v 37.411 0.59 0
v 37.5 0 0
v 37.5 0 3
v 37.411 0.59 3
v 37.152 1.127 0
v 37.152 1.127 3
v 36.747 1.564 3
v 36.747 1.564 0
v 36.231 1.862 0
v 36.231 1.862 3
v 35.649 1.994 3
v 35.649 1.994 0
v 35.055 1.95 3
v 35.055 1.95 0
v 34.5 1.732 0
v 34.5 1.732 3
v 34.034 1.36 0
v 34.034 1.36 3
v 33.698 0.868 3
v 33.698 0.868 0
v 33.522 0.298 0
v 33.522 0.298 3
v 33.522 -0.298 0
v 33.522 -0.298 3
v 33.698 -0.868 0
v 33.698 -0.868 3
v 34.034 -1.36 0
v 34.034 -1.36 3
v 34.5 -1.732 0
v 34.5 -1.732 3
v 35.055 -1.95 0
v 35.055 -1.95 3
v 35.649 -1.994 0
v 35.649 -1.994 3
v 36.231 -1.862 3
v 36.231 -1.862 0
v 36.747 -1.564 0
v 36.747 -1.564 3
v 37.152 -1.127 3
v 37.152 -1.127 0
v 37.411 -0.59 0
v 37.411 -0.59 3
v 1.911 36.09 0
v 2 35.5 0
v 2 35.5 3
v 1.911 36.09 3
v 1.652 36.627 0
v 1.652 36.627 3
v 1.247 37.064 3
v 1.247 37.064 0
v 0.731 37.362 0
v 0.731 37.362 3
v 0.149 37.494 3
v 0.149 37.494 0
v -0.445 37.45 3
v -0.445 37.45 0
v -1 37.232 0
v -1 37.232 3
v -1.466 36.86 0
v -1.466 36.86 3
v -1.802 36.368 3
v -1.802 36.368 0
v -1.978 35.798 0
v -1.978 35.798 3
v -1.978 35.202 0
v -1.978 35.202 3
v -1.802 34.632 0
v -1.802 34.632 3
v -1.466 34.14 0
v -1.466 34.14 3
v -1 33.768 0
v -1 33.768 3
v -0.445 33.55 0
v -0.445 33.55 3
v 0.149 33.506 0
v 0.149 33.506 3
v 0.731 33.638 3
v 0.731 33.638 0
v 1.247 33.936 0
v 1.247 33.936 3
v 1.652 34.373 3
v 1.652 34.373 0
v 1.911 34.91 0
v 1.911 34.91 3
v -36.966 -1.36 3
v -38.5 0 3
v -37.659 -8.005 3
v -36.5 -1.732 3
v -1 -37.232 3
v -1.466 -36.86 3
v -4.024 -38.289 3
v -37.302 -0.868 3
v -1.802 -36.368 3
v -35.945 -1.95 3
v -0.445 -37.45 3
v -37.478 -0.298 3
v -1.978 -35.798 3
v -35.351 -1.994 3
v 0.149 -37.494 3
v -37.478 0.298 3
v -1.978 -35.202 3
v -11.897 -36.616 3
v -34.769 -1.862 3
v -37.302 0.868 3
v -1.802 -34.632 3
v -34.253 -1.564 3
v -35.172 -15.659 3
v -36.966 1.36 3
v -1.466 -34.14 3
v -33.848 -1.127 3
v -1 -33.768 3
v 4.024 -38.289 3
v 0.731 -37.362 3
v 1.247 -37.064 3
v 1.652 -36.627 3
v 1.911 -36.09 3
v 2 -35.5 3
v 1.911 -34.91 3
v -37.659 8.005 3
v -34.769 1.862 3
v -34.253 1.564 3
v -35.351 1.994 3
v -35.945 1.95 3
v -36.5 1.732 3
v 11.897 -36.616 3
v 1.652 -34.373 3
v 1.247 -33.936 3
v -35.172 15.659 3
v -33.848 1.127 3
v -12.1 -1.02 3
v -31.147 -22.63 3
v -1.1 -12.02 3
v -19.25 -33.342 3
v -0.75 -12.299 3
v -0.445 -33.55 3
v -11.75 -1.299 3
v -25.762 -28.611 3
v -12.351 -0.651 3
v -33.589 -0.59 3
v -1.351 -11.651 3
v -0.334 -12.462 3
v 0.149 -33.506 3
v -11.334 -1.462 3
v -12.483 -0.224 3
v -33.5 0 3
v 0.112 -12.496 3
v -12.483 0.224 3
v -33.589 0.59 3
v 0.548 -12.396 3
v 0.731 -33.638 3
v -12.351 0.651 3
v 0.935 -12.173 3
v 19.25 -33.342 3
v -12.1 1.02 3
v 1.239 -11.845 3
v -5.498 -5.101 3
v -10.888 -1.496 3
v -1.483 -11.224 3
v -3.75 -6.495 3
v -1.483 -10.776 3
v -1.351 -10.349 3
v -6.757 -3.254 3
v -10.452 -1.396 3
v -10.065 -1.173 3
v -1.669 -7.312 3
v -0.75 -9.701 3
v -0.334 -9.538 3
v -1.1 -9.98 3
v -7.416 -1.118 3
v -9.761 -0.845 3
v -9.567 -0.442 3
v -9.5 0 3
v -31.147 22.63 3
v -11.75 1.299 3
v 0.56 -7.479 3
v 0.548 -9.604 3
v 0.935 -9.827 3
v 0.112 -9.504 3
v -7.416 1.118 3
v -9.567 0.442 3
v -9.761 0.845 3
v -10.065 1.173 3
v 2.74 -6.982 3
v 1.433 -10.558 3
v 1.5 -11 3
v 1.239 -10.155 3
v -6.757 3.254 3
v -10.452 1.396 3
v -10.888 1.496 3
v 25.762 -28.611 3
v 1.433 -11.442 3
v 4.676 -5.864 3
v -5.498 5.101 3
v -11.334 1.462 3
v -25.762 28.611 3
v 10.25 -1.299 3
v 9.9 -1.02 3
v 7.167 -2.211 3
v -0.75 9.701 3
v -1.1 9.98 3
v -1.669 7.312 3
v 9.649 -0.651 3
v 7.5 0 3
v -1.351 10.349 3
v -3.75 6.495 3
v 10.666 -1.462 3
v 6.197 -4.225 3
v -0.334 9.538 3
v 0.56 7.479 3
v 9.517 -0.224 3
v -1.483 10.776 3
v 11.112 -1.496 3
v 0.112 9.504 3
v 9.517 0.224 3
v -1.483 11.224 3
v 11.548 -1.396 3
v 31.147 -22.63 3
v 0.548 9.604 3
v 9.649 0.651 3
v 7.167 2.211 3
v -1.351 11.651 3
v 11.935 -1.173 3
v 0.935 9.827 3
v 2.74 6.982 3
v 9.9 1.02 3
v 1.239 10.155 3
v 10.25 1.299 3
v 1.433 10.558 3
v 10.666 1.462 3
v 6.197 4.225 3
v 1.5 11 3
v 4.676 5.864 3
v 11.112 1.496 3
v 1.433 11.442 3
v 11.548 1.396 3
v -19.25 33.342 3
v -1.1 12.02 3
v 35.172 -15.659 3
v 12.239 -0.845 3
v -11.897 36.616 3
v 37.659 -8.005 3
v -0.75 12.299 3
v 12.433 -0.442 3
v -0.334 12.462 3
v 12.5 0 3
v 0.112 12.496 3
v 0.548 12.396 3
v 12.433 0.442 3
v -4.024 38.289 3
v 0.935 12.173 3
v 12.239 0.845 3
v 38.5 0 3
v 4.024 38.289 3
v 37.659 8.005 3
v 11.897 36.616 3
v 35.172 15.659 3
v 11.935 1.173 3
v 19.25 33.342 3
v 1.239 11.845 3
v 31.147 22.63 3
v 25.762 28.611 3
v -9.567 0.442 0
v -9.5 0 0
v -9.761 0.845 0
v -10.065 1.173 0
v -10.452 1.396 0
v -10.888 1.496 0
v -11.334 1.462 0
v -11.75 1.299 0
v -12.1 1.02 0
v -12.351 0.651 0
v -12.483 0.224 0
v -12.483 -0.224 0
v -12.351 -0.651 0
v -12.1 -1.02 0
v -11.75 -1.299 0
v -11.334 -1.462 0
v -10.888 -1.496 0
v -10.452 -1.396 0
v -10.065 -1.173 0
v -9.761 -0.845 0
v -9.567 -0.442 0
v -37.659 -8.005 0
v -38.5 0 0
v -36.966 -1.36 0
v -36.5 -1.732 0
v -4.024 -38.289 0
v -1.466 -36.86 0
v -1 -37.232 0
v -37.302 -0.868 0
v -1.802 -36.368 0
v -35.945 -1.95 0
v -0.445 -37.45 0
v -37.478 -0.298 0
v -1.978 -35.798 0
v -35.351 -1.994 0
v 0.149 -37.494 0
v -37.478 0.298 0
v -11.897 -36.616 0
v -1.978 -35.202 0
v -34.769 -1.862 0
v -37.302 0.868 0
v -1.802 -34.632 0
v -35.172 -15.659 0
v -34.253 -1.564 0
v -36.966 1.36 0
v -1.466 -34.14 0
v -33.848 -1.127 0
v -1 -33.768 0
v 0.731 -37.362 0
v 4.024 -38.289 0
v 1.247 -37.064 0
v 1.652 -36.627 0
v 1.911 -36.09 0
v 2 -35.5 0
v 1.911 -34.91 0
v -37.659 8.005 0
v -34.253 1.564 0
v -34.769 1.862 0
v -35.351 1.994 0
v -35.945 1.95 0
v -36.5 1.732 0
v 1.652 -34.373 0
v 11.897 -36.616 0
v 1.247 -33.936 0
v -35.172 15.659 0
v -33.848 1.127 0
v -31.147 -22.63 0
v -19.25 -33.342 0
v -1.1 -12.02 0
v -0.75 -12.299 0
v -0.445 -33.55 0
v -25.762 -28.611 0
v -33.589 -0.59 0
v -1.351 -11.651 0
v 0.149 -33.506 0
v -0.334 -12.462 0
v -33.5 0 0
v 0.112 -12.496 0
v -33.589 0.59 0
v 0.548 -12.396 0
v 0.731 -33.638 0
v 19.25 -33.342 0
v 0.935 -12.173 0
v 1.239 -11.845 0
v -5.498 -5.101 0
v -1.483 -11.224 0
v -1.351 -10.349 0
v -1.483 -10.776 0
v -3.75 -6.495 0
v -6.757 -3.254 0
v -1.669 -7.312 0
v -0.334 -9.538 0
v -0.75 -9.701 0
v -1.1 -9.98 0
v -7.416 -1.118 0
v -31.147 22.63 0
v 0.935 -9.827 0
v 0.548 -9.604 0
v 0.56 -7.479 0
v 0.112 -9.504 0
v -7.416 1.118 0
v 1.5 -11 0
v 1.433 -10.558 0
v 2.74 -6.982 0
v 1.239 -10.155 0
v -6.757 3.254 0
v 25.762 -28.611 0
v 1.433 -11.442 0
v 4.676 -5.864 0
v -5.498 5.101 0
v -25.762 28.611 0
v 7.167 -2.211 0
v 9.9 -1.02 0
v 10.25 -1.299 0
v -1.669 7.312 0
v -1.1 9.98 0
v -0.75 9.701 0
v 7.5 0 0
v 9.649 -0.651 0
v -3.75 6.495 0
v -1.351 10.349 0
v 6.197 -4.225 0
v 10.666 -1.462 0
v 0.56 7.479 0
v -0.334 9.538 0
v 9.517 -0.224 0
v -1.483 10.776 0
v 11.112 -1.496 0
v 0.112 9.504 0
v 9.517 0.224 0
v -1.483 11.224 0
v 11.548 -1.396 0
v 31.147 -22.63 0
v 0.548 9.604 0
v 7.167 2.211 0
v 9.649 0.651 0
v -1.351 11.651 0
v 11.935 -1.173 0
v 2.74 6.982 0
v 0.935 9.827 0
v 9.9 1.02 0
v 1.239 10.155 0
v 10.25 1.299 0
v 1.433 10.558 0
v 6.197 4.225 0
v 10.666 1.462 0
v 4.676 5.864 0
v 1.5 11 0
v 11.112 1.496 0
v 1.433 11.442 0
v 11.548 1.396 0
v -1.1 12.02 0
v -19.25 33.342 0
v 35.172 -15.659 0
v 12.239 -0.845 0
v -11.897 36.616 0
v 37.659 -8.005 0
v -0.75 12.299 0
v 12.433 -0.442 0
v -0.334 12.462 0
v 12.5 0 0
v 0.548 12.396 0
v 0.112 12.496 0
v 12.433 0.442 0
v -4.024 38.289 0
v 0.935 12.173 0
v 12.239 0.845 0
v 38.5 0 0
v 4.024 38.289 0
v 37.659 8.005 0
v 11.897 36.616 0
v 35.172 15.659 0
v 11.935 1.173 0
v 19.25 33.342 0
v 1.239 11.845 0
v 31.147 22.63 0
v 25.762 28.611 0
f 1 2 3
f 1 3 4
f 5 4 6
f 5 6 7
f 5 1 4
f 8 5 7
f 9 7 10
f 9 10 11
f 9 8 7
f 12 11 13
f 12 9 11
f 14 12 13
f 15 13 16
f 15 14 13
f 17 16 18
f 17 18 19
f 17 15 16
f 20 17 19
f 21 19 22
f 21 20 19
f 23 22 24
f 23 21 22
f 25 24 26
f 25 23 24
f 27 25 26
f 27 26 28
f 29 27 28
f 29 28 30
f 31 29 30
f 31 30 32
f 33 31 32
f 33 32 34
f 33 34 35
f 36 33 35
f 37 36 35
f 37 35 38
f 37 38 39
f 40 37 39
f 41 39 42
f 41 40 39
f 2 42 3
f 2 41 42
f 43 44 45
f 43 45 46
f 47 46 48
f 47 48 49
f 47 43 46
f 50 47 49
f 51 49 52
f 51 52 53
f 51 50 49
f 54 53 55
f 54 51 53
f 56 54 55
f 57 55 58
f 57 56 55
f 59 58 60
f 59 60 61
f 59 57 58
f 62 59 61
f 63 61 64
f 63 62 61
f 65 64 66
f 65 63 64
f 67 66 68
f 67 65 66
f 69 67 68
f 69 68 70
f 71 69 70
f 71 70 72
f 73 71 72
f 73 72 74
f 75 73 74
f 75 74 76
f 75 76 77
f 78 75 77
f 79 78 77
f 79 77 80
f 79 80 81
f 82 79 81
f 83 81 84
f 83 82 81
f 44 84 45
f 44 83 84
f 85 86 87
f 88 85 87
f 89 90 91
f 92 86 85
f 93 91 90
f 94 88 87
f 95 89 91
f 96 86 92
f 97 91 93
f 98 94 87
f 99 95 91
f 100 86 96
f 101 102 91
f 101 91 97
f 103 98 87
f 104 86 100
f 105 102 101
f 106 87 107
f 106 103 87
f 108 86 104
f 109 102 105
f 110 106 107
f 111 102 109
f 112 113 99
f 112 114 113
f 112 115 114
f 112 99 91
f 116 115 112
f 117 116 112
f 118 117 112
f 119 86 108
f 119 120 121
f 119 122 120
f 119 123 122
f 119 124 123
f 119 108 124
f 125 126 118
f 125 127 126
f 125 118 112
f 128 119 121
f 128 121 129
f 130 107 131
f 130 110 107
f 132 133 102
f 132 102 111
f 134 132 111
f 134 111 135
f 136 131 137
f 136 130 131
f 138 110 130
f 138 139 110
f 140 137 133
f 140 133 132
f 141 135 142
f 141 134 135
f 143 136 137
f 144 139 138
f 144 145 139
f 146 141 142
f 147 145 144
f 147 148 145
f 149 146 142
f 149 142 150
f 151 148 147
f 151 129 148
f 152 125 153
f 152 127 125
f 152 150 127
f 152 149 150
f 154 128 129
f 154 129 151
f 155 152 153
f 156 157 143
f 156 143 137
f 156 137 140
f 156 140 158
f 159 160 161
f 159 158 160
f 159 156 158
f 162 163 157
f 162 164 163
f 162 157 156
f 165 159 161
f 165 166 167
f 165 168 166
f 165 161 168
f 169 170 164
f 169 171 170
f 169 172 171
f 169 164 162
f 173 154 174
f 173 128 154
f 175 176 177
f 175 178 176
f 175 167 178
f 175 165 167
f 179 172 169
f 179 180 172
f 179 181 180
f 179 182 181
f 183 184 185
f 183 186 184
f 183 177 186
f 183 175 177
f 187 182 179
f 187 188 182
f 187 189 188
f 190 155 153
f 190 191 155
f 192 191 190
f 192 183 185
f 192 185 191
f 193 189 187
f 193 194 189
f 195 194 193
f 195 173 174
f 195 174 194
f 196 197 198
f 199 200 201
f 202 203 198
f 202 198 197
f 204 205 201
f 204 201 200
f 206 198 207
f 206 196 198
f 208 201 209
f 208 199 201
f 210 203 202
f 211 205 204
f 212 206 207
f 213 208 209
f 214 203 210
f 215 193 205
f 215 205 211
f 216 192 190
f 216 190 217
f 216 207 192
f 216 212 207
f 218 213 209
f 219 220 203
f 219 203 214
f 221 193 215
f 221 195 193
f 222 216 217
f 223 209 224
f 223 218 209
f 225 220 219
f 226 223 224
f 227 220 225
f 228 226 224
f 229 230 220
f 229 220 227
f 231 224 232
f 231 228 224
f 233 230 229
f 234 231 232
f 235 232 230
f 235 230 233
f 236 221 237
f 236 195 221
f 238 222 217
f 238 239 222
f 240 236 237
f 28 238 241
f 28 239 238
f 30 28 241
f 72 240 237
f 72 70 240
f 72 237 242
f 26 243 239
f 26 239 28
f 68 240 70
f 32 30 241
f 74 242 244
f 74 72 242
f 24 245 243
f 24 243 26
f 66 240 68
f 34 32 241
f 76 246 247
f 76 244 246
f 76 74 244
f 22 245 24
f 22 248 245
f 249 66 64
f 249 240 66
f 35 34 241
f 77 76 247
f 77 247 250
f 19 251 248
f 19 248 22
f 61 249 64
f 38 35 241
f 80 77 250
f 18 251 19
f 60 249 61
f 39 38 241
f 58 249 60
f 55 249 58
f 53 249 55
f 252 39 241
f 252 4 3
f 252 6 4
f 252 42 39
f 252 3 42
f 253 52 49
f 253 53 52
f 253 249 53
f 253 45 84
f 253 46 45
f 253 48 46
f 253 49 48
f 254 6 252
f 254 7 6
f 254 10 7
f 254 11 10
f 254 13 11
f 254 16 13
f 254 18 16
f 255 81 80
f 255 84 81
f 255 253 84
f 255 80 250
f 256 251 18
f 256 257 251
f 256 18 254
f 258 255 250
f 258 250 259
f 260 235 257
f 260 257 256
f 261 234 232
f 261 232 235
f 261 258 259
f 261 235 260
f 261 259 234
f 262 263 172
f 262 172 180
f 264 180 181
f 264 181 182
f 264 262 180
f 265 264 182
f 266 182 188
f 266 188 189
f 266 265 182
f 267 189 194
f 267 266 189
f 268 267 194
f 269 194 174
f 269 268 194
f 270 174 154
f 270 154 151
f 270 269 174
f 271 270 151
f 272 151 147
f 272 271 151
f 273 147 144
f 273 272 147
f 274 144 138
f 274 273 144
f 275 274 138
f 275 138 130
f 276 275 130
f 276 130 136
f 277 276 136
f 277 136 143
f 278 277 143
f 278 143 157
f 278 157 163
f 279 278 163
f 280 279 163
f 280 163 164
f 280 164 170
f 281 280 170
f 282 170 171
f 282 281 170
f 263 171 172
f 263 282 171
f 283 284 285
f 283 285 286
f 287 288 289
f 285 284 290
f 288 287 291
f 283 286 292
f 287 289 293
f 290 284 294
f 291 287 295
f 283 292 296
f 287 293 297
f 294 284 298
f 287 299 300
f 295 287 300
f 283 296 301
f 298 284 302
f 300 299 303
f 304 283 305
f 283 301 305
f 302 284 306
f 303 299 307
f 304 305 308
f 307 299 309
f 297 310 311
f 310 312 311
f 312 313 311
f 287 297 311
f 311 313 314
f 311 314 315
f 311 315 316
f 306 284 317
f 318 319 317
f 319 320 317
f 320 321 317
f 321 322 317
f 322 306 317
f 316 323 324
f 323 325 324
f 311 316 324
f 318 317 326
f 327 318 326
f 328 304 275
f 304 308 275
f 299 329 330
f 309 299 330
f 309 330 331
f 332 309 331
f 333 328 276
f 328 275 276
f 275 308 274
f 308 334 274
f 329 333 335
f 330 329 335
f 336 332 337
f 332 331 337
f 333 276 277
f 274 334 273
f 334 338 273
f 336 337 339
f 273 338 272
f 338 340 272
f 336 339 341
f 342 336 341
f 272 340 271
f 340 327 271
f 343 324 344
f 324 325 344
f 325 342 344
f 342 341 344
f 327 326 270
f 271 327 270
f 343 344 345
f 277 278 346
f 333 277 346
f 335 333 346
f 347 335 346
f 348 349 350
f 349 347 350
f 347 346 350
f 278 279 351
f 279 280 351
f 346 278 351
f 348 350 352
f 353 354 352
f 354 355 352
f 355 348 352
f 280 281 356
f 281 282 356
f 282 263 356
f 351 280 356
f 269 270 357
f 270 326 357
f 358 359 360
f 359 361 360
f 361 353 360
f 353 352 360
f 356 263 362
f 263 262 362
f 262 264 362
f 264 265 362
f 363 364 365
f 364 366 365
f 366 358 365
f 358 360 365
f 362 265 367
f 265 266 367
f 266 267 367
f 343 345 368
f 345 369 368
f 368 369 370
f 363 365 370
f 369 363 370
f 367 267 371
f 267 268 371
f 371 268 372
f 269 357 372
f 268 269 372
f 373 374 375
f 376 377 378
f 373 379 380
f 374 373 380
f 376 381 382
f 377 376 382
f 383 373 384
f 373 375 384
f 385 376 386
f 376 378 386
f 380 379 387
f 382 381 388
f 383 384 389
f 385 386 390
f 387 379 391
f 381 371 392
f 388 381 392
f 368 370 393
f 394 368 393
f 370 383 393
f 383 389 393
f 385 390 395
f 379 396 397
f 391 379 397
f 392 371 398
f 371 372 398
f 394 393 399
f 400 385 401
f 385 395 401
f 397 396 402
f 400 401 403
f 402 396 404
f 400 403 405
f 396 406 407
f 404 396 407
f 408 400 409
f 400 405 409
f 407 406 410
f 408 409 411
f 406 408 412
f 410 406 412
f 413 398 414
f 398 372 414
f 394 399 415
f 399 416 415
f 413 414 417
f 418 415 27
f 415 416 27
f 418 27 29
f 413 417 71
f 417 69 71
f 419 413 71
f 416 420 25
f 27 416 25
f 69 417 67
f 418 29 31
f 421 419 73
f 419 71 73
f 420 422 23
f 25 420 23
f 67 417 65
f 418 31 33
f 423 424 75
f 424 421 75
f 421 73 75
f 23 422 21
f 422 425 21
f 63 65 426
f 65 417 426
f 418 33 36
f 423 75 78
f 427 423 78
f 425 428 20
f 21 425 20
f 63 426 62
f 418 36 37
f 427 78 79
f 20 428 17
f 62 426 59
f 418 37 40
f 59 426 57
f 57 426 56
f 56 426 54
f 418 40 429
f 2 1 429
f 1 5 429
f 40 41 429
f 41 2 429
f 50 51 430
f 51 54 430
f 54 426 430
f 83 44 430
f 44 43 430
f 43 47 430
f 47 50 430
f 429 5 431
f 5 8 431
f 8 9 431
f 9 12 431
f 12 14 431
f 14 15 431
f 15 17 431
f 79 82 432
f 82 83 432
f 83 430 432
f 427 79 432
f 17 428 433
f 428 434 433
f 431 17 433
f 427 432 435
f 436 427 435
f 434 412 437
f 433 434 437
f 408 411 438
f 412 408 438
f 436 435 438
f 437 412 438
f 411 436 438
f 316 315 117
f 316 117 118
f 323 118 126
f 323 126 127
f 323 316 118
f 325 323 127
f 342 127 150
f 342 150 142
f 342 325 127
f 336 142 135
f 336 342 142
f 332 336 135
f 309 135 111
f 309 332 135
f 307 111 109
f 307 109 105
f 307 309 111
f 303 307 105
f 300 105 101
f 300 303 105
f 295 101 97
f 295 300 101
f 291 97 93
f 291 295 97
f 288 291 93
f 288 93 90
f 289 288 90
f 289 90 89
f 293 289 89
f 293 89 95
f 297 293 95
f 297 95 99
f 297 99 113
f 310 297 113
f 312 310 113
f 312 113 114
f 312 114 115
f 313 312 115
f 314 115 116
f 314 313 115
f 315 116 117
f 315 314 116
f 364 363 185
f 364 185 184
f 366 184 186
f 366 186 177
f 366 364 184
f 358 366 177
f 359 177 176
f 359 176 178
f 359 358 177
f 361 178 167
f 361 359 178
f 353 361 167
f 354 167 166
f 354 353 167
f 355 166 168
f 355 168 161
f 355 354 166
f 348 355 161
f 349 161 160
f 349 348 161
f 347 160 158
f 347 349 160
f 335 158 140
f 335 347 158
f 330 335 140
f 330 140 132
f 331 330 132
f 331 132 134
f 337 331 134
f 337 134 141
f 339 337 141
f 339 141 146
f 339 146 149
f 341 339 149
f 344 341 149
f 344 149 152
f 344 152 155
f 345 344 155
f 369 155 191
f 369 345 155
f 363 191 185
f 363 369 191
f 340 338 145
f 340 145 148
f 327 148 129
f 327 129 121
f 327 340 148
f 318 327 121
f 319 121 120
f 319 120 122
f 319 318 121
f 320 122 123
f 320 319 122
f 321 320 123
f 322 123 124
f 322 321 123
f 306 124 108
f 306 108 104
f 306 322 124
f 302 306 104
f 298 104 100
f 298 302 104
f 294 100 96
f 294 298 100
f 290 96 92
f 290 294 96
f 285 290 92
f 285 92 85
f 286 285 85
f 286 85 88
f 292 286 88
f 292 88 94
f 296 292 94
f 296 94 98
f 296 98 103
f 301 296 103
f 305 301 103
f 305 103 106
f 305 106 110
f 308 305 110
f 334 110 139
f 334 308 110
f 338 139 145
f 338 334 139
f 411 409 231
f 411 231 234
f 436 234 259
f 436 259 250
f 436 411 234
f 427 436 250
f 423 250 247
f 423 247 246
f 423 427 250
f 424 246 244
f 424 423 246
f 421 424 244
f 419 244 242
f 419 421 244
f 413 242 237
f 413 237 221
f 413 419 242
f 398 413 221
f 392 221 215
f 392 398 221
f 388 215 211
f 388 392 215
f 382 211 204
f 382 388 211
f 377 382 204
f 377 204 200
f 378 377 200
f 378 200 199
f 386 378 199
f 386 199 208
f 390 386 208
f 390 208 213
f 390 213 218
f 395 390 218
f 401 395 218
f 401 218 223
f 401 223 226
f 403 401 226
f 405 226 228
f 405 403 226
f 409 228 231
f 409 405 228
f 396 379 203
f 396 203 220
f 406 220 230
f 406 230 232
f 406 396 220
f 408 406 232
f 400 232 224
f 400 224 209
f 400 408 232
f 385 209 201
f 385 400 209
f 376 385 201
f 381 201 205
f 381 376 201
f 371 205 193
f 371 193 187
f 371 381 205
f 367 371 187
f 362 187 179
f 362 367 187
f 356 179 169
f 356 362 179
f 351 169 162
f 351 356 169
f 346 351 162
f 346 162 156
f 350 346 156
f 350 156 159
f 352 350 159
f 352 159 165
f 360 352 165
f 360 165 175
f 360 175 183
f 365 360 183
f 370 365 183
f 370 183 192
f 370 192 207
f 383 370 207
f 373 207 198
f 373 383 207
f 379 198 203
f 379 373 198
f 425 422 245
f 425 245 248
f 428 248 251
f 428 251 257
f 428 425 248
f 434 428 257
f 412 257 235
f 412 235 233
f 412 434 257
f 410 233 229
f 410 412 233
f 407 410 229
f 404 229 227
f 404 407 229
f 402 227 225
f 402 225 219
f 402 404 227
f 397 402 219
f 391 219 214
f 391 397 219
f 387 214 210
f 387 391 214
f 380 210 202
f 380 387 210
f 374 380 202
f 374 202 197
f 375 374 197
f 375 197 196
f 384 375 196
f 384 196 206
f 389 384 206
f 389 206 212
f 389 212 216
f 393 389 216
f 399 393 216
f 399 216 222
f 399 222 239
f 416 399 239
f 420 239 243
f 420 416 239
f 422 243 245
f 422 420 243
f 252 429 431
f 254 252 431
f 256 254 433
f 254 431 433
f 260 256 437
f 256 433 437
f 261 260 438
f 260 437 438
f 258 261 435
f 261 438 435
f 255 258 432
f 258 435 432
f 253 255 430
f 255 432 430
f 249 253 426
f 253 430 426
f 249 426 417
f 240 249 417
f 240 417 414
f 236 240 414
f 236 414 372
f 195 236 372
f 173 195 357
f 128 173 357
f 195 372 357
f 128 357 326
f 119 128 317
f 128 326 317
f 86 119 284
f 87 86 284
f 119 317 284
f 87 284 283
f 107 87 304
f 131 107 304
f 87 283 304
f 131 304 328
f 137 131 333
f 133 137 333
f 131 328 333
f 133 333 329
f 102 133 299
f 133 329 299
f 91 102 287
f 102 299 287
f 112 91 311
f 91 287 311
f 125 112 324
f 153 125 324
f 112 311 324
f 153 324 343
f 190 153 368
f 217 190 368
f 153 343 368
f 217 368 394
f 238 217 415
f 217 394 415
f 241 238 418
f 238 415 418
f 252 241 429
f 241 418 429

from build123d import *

# Parameters (mm, degrees)
SKETCH1_R           = 38.5
SKETCH1_R_2         = 1.5
SKETCH1_R_3         = 2
SKETCH1_R_4         = 7.5
BOSS_EXTRUDE1_DEPTH = 3


with BuildPart() as part:
    # Sketch1 → Boss-Extrude1 (new body)
    with BuildSketch(Plane.XY):
        Circle(SKETCH1_R)
        with Locations((0, 11)):
            Circle(SKETCH1_R_2, mode=Mode.SUBTRACT)
        with Locations((0, 35.5)):
            Circle(SKETCH1_R_3, mode=Mode.SUBTRACT)
        with Locations((35.5, 0)):
            Circle(SKETCH1_R_3, mode=Mode.SUBTRACT)
        with Locations((11, 0)):
            Circle(SKETCH1_R_2, mode=Mode.SUBTRACT)
        with Locations((0, -35.5)):
            Circle(SKETCH1_R_3, mode=Mode.SUBTRACT)
        with Locations((0, -11)):
            Circle(SKETCH1_R_2, mode=Mode.SUBTRACT)
        with Locations((-35.5, 0)):
            Circle(SKETCH1_R_3, mode=Mode.SUBTRACT)
        with Locations((-11, 0)):
            Circle(SKETCH1_R_2, mode=Mode.SUBTRACT)
        Circle(SKETCH1_R_4, mode=Mode.SUBTRACT)
    extrude(amount=BOSS_EXTRUDE1_DEPTH)


solid = part.part
